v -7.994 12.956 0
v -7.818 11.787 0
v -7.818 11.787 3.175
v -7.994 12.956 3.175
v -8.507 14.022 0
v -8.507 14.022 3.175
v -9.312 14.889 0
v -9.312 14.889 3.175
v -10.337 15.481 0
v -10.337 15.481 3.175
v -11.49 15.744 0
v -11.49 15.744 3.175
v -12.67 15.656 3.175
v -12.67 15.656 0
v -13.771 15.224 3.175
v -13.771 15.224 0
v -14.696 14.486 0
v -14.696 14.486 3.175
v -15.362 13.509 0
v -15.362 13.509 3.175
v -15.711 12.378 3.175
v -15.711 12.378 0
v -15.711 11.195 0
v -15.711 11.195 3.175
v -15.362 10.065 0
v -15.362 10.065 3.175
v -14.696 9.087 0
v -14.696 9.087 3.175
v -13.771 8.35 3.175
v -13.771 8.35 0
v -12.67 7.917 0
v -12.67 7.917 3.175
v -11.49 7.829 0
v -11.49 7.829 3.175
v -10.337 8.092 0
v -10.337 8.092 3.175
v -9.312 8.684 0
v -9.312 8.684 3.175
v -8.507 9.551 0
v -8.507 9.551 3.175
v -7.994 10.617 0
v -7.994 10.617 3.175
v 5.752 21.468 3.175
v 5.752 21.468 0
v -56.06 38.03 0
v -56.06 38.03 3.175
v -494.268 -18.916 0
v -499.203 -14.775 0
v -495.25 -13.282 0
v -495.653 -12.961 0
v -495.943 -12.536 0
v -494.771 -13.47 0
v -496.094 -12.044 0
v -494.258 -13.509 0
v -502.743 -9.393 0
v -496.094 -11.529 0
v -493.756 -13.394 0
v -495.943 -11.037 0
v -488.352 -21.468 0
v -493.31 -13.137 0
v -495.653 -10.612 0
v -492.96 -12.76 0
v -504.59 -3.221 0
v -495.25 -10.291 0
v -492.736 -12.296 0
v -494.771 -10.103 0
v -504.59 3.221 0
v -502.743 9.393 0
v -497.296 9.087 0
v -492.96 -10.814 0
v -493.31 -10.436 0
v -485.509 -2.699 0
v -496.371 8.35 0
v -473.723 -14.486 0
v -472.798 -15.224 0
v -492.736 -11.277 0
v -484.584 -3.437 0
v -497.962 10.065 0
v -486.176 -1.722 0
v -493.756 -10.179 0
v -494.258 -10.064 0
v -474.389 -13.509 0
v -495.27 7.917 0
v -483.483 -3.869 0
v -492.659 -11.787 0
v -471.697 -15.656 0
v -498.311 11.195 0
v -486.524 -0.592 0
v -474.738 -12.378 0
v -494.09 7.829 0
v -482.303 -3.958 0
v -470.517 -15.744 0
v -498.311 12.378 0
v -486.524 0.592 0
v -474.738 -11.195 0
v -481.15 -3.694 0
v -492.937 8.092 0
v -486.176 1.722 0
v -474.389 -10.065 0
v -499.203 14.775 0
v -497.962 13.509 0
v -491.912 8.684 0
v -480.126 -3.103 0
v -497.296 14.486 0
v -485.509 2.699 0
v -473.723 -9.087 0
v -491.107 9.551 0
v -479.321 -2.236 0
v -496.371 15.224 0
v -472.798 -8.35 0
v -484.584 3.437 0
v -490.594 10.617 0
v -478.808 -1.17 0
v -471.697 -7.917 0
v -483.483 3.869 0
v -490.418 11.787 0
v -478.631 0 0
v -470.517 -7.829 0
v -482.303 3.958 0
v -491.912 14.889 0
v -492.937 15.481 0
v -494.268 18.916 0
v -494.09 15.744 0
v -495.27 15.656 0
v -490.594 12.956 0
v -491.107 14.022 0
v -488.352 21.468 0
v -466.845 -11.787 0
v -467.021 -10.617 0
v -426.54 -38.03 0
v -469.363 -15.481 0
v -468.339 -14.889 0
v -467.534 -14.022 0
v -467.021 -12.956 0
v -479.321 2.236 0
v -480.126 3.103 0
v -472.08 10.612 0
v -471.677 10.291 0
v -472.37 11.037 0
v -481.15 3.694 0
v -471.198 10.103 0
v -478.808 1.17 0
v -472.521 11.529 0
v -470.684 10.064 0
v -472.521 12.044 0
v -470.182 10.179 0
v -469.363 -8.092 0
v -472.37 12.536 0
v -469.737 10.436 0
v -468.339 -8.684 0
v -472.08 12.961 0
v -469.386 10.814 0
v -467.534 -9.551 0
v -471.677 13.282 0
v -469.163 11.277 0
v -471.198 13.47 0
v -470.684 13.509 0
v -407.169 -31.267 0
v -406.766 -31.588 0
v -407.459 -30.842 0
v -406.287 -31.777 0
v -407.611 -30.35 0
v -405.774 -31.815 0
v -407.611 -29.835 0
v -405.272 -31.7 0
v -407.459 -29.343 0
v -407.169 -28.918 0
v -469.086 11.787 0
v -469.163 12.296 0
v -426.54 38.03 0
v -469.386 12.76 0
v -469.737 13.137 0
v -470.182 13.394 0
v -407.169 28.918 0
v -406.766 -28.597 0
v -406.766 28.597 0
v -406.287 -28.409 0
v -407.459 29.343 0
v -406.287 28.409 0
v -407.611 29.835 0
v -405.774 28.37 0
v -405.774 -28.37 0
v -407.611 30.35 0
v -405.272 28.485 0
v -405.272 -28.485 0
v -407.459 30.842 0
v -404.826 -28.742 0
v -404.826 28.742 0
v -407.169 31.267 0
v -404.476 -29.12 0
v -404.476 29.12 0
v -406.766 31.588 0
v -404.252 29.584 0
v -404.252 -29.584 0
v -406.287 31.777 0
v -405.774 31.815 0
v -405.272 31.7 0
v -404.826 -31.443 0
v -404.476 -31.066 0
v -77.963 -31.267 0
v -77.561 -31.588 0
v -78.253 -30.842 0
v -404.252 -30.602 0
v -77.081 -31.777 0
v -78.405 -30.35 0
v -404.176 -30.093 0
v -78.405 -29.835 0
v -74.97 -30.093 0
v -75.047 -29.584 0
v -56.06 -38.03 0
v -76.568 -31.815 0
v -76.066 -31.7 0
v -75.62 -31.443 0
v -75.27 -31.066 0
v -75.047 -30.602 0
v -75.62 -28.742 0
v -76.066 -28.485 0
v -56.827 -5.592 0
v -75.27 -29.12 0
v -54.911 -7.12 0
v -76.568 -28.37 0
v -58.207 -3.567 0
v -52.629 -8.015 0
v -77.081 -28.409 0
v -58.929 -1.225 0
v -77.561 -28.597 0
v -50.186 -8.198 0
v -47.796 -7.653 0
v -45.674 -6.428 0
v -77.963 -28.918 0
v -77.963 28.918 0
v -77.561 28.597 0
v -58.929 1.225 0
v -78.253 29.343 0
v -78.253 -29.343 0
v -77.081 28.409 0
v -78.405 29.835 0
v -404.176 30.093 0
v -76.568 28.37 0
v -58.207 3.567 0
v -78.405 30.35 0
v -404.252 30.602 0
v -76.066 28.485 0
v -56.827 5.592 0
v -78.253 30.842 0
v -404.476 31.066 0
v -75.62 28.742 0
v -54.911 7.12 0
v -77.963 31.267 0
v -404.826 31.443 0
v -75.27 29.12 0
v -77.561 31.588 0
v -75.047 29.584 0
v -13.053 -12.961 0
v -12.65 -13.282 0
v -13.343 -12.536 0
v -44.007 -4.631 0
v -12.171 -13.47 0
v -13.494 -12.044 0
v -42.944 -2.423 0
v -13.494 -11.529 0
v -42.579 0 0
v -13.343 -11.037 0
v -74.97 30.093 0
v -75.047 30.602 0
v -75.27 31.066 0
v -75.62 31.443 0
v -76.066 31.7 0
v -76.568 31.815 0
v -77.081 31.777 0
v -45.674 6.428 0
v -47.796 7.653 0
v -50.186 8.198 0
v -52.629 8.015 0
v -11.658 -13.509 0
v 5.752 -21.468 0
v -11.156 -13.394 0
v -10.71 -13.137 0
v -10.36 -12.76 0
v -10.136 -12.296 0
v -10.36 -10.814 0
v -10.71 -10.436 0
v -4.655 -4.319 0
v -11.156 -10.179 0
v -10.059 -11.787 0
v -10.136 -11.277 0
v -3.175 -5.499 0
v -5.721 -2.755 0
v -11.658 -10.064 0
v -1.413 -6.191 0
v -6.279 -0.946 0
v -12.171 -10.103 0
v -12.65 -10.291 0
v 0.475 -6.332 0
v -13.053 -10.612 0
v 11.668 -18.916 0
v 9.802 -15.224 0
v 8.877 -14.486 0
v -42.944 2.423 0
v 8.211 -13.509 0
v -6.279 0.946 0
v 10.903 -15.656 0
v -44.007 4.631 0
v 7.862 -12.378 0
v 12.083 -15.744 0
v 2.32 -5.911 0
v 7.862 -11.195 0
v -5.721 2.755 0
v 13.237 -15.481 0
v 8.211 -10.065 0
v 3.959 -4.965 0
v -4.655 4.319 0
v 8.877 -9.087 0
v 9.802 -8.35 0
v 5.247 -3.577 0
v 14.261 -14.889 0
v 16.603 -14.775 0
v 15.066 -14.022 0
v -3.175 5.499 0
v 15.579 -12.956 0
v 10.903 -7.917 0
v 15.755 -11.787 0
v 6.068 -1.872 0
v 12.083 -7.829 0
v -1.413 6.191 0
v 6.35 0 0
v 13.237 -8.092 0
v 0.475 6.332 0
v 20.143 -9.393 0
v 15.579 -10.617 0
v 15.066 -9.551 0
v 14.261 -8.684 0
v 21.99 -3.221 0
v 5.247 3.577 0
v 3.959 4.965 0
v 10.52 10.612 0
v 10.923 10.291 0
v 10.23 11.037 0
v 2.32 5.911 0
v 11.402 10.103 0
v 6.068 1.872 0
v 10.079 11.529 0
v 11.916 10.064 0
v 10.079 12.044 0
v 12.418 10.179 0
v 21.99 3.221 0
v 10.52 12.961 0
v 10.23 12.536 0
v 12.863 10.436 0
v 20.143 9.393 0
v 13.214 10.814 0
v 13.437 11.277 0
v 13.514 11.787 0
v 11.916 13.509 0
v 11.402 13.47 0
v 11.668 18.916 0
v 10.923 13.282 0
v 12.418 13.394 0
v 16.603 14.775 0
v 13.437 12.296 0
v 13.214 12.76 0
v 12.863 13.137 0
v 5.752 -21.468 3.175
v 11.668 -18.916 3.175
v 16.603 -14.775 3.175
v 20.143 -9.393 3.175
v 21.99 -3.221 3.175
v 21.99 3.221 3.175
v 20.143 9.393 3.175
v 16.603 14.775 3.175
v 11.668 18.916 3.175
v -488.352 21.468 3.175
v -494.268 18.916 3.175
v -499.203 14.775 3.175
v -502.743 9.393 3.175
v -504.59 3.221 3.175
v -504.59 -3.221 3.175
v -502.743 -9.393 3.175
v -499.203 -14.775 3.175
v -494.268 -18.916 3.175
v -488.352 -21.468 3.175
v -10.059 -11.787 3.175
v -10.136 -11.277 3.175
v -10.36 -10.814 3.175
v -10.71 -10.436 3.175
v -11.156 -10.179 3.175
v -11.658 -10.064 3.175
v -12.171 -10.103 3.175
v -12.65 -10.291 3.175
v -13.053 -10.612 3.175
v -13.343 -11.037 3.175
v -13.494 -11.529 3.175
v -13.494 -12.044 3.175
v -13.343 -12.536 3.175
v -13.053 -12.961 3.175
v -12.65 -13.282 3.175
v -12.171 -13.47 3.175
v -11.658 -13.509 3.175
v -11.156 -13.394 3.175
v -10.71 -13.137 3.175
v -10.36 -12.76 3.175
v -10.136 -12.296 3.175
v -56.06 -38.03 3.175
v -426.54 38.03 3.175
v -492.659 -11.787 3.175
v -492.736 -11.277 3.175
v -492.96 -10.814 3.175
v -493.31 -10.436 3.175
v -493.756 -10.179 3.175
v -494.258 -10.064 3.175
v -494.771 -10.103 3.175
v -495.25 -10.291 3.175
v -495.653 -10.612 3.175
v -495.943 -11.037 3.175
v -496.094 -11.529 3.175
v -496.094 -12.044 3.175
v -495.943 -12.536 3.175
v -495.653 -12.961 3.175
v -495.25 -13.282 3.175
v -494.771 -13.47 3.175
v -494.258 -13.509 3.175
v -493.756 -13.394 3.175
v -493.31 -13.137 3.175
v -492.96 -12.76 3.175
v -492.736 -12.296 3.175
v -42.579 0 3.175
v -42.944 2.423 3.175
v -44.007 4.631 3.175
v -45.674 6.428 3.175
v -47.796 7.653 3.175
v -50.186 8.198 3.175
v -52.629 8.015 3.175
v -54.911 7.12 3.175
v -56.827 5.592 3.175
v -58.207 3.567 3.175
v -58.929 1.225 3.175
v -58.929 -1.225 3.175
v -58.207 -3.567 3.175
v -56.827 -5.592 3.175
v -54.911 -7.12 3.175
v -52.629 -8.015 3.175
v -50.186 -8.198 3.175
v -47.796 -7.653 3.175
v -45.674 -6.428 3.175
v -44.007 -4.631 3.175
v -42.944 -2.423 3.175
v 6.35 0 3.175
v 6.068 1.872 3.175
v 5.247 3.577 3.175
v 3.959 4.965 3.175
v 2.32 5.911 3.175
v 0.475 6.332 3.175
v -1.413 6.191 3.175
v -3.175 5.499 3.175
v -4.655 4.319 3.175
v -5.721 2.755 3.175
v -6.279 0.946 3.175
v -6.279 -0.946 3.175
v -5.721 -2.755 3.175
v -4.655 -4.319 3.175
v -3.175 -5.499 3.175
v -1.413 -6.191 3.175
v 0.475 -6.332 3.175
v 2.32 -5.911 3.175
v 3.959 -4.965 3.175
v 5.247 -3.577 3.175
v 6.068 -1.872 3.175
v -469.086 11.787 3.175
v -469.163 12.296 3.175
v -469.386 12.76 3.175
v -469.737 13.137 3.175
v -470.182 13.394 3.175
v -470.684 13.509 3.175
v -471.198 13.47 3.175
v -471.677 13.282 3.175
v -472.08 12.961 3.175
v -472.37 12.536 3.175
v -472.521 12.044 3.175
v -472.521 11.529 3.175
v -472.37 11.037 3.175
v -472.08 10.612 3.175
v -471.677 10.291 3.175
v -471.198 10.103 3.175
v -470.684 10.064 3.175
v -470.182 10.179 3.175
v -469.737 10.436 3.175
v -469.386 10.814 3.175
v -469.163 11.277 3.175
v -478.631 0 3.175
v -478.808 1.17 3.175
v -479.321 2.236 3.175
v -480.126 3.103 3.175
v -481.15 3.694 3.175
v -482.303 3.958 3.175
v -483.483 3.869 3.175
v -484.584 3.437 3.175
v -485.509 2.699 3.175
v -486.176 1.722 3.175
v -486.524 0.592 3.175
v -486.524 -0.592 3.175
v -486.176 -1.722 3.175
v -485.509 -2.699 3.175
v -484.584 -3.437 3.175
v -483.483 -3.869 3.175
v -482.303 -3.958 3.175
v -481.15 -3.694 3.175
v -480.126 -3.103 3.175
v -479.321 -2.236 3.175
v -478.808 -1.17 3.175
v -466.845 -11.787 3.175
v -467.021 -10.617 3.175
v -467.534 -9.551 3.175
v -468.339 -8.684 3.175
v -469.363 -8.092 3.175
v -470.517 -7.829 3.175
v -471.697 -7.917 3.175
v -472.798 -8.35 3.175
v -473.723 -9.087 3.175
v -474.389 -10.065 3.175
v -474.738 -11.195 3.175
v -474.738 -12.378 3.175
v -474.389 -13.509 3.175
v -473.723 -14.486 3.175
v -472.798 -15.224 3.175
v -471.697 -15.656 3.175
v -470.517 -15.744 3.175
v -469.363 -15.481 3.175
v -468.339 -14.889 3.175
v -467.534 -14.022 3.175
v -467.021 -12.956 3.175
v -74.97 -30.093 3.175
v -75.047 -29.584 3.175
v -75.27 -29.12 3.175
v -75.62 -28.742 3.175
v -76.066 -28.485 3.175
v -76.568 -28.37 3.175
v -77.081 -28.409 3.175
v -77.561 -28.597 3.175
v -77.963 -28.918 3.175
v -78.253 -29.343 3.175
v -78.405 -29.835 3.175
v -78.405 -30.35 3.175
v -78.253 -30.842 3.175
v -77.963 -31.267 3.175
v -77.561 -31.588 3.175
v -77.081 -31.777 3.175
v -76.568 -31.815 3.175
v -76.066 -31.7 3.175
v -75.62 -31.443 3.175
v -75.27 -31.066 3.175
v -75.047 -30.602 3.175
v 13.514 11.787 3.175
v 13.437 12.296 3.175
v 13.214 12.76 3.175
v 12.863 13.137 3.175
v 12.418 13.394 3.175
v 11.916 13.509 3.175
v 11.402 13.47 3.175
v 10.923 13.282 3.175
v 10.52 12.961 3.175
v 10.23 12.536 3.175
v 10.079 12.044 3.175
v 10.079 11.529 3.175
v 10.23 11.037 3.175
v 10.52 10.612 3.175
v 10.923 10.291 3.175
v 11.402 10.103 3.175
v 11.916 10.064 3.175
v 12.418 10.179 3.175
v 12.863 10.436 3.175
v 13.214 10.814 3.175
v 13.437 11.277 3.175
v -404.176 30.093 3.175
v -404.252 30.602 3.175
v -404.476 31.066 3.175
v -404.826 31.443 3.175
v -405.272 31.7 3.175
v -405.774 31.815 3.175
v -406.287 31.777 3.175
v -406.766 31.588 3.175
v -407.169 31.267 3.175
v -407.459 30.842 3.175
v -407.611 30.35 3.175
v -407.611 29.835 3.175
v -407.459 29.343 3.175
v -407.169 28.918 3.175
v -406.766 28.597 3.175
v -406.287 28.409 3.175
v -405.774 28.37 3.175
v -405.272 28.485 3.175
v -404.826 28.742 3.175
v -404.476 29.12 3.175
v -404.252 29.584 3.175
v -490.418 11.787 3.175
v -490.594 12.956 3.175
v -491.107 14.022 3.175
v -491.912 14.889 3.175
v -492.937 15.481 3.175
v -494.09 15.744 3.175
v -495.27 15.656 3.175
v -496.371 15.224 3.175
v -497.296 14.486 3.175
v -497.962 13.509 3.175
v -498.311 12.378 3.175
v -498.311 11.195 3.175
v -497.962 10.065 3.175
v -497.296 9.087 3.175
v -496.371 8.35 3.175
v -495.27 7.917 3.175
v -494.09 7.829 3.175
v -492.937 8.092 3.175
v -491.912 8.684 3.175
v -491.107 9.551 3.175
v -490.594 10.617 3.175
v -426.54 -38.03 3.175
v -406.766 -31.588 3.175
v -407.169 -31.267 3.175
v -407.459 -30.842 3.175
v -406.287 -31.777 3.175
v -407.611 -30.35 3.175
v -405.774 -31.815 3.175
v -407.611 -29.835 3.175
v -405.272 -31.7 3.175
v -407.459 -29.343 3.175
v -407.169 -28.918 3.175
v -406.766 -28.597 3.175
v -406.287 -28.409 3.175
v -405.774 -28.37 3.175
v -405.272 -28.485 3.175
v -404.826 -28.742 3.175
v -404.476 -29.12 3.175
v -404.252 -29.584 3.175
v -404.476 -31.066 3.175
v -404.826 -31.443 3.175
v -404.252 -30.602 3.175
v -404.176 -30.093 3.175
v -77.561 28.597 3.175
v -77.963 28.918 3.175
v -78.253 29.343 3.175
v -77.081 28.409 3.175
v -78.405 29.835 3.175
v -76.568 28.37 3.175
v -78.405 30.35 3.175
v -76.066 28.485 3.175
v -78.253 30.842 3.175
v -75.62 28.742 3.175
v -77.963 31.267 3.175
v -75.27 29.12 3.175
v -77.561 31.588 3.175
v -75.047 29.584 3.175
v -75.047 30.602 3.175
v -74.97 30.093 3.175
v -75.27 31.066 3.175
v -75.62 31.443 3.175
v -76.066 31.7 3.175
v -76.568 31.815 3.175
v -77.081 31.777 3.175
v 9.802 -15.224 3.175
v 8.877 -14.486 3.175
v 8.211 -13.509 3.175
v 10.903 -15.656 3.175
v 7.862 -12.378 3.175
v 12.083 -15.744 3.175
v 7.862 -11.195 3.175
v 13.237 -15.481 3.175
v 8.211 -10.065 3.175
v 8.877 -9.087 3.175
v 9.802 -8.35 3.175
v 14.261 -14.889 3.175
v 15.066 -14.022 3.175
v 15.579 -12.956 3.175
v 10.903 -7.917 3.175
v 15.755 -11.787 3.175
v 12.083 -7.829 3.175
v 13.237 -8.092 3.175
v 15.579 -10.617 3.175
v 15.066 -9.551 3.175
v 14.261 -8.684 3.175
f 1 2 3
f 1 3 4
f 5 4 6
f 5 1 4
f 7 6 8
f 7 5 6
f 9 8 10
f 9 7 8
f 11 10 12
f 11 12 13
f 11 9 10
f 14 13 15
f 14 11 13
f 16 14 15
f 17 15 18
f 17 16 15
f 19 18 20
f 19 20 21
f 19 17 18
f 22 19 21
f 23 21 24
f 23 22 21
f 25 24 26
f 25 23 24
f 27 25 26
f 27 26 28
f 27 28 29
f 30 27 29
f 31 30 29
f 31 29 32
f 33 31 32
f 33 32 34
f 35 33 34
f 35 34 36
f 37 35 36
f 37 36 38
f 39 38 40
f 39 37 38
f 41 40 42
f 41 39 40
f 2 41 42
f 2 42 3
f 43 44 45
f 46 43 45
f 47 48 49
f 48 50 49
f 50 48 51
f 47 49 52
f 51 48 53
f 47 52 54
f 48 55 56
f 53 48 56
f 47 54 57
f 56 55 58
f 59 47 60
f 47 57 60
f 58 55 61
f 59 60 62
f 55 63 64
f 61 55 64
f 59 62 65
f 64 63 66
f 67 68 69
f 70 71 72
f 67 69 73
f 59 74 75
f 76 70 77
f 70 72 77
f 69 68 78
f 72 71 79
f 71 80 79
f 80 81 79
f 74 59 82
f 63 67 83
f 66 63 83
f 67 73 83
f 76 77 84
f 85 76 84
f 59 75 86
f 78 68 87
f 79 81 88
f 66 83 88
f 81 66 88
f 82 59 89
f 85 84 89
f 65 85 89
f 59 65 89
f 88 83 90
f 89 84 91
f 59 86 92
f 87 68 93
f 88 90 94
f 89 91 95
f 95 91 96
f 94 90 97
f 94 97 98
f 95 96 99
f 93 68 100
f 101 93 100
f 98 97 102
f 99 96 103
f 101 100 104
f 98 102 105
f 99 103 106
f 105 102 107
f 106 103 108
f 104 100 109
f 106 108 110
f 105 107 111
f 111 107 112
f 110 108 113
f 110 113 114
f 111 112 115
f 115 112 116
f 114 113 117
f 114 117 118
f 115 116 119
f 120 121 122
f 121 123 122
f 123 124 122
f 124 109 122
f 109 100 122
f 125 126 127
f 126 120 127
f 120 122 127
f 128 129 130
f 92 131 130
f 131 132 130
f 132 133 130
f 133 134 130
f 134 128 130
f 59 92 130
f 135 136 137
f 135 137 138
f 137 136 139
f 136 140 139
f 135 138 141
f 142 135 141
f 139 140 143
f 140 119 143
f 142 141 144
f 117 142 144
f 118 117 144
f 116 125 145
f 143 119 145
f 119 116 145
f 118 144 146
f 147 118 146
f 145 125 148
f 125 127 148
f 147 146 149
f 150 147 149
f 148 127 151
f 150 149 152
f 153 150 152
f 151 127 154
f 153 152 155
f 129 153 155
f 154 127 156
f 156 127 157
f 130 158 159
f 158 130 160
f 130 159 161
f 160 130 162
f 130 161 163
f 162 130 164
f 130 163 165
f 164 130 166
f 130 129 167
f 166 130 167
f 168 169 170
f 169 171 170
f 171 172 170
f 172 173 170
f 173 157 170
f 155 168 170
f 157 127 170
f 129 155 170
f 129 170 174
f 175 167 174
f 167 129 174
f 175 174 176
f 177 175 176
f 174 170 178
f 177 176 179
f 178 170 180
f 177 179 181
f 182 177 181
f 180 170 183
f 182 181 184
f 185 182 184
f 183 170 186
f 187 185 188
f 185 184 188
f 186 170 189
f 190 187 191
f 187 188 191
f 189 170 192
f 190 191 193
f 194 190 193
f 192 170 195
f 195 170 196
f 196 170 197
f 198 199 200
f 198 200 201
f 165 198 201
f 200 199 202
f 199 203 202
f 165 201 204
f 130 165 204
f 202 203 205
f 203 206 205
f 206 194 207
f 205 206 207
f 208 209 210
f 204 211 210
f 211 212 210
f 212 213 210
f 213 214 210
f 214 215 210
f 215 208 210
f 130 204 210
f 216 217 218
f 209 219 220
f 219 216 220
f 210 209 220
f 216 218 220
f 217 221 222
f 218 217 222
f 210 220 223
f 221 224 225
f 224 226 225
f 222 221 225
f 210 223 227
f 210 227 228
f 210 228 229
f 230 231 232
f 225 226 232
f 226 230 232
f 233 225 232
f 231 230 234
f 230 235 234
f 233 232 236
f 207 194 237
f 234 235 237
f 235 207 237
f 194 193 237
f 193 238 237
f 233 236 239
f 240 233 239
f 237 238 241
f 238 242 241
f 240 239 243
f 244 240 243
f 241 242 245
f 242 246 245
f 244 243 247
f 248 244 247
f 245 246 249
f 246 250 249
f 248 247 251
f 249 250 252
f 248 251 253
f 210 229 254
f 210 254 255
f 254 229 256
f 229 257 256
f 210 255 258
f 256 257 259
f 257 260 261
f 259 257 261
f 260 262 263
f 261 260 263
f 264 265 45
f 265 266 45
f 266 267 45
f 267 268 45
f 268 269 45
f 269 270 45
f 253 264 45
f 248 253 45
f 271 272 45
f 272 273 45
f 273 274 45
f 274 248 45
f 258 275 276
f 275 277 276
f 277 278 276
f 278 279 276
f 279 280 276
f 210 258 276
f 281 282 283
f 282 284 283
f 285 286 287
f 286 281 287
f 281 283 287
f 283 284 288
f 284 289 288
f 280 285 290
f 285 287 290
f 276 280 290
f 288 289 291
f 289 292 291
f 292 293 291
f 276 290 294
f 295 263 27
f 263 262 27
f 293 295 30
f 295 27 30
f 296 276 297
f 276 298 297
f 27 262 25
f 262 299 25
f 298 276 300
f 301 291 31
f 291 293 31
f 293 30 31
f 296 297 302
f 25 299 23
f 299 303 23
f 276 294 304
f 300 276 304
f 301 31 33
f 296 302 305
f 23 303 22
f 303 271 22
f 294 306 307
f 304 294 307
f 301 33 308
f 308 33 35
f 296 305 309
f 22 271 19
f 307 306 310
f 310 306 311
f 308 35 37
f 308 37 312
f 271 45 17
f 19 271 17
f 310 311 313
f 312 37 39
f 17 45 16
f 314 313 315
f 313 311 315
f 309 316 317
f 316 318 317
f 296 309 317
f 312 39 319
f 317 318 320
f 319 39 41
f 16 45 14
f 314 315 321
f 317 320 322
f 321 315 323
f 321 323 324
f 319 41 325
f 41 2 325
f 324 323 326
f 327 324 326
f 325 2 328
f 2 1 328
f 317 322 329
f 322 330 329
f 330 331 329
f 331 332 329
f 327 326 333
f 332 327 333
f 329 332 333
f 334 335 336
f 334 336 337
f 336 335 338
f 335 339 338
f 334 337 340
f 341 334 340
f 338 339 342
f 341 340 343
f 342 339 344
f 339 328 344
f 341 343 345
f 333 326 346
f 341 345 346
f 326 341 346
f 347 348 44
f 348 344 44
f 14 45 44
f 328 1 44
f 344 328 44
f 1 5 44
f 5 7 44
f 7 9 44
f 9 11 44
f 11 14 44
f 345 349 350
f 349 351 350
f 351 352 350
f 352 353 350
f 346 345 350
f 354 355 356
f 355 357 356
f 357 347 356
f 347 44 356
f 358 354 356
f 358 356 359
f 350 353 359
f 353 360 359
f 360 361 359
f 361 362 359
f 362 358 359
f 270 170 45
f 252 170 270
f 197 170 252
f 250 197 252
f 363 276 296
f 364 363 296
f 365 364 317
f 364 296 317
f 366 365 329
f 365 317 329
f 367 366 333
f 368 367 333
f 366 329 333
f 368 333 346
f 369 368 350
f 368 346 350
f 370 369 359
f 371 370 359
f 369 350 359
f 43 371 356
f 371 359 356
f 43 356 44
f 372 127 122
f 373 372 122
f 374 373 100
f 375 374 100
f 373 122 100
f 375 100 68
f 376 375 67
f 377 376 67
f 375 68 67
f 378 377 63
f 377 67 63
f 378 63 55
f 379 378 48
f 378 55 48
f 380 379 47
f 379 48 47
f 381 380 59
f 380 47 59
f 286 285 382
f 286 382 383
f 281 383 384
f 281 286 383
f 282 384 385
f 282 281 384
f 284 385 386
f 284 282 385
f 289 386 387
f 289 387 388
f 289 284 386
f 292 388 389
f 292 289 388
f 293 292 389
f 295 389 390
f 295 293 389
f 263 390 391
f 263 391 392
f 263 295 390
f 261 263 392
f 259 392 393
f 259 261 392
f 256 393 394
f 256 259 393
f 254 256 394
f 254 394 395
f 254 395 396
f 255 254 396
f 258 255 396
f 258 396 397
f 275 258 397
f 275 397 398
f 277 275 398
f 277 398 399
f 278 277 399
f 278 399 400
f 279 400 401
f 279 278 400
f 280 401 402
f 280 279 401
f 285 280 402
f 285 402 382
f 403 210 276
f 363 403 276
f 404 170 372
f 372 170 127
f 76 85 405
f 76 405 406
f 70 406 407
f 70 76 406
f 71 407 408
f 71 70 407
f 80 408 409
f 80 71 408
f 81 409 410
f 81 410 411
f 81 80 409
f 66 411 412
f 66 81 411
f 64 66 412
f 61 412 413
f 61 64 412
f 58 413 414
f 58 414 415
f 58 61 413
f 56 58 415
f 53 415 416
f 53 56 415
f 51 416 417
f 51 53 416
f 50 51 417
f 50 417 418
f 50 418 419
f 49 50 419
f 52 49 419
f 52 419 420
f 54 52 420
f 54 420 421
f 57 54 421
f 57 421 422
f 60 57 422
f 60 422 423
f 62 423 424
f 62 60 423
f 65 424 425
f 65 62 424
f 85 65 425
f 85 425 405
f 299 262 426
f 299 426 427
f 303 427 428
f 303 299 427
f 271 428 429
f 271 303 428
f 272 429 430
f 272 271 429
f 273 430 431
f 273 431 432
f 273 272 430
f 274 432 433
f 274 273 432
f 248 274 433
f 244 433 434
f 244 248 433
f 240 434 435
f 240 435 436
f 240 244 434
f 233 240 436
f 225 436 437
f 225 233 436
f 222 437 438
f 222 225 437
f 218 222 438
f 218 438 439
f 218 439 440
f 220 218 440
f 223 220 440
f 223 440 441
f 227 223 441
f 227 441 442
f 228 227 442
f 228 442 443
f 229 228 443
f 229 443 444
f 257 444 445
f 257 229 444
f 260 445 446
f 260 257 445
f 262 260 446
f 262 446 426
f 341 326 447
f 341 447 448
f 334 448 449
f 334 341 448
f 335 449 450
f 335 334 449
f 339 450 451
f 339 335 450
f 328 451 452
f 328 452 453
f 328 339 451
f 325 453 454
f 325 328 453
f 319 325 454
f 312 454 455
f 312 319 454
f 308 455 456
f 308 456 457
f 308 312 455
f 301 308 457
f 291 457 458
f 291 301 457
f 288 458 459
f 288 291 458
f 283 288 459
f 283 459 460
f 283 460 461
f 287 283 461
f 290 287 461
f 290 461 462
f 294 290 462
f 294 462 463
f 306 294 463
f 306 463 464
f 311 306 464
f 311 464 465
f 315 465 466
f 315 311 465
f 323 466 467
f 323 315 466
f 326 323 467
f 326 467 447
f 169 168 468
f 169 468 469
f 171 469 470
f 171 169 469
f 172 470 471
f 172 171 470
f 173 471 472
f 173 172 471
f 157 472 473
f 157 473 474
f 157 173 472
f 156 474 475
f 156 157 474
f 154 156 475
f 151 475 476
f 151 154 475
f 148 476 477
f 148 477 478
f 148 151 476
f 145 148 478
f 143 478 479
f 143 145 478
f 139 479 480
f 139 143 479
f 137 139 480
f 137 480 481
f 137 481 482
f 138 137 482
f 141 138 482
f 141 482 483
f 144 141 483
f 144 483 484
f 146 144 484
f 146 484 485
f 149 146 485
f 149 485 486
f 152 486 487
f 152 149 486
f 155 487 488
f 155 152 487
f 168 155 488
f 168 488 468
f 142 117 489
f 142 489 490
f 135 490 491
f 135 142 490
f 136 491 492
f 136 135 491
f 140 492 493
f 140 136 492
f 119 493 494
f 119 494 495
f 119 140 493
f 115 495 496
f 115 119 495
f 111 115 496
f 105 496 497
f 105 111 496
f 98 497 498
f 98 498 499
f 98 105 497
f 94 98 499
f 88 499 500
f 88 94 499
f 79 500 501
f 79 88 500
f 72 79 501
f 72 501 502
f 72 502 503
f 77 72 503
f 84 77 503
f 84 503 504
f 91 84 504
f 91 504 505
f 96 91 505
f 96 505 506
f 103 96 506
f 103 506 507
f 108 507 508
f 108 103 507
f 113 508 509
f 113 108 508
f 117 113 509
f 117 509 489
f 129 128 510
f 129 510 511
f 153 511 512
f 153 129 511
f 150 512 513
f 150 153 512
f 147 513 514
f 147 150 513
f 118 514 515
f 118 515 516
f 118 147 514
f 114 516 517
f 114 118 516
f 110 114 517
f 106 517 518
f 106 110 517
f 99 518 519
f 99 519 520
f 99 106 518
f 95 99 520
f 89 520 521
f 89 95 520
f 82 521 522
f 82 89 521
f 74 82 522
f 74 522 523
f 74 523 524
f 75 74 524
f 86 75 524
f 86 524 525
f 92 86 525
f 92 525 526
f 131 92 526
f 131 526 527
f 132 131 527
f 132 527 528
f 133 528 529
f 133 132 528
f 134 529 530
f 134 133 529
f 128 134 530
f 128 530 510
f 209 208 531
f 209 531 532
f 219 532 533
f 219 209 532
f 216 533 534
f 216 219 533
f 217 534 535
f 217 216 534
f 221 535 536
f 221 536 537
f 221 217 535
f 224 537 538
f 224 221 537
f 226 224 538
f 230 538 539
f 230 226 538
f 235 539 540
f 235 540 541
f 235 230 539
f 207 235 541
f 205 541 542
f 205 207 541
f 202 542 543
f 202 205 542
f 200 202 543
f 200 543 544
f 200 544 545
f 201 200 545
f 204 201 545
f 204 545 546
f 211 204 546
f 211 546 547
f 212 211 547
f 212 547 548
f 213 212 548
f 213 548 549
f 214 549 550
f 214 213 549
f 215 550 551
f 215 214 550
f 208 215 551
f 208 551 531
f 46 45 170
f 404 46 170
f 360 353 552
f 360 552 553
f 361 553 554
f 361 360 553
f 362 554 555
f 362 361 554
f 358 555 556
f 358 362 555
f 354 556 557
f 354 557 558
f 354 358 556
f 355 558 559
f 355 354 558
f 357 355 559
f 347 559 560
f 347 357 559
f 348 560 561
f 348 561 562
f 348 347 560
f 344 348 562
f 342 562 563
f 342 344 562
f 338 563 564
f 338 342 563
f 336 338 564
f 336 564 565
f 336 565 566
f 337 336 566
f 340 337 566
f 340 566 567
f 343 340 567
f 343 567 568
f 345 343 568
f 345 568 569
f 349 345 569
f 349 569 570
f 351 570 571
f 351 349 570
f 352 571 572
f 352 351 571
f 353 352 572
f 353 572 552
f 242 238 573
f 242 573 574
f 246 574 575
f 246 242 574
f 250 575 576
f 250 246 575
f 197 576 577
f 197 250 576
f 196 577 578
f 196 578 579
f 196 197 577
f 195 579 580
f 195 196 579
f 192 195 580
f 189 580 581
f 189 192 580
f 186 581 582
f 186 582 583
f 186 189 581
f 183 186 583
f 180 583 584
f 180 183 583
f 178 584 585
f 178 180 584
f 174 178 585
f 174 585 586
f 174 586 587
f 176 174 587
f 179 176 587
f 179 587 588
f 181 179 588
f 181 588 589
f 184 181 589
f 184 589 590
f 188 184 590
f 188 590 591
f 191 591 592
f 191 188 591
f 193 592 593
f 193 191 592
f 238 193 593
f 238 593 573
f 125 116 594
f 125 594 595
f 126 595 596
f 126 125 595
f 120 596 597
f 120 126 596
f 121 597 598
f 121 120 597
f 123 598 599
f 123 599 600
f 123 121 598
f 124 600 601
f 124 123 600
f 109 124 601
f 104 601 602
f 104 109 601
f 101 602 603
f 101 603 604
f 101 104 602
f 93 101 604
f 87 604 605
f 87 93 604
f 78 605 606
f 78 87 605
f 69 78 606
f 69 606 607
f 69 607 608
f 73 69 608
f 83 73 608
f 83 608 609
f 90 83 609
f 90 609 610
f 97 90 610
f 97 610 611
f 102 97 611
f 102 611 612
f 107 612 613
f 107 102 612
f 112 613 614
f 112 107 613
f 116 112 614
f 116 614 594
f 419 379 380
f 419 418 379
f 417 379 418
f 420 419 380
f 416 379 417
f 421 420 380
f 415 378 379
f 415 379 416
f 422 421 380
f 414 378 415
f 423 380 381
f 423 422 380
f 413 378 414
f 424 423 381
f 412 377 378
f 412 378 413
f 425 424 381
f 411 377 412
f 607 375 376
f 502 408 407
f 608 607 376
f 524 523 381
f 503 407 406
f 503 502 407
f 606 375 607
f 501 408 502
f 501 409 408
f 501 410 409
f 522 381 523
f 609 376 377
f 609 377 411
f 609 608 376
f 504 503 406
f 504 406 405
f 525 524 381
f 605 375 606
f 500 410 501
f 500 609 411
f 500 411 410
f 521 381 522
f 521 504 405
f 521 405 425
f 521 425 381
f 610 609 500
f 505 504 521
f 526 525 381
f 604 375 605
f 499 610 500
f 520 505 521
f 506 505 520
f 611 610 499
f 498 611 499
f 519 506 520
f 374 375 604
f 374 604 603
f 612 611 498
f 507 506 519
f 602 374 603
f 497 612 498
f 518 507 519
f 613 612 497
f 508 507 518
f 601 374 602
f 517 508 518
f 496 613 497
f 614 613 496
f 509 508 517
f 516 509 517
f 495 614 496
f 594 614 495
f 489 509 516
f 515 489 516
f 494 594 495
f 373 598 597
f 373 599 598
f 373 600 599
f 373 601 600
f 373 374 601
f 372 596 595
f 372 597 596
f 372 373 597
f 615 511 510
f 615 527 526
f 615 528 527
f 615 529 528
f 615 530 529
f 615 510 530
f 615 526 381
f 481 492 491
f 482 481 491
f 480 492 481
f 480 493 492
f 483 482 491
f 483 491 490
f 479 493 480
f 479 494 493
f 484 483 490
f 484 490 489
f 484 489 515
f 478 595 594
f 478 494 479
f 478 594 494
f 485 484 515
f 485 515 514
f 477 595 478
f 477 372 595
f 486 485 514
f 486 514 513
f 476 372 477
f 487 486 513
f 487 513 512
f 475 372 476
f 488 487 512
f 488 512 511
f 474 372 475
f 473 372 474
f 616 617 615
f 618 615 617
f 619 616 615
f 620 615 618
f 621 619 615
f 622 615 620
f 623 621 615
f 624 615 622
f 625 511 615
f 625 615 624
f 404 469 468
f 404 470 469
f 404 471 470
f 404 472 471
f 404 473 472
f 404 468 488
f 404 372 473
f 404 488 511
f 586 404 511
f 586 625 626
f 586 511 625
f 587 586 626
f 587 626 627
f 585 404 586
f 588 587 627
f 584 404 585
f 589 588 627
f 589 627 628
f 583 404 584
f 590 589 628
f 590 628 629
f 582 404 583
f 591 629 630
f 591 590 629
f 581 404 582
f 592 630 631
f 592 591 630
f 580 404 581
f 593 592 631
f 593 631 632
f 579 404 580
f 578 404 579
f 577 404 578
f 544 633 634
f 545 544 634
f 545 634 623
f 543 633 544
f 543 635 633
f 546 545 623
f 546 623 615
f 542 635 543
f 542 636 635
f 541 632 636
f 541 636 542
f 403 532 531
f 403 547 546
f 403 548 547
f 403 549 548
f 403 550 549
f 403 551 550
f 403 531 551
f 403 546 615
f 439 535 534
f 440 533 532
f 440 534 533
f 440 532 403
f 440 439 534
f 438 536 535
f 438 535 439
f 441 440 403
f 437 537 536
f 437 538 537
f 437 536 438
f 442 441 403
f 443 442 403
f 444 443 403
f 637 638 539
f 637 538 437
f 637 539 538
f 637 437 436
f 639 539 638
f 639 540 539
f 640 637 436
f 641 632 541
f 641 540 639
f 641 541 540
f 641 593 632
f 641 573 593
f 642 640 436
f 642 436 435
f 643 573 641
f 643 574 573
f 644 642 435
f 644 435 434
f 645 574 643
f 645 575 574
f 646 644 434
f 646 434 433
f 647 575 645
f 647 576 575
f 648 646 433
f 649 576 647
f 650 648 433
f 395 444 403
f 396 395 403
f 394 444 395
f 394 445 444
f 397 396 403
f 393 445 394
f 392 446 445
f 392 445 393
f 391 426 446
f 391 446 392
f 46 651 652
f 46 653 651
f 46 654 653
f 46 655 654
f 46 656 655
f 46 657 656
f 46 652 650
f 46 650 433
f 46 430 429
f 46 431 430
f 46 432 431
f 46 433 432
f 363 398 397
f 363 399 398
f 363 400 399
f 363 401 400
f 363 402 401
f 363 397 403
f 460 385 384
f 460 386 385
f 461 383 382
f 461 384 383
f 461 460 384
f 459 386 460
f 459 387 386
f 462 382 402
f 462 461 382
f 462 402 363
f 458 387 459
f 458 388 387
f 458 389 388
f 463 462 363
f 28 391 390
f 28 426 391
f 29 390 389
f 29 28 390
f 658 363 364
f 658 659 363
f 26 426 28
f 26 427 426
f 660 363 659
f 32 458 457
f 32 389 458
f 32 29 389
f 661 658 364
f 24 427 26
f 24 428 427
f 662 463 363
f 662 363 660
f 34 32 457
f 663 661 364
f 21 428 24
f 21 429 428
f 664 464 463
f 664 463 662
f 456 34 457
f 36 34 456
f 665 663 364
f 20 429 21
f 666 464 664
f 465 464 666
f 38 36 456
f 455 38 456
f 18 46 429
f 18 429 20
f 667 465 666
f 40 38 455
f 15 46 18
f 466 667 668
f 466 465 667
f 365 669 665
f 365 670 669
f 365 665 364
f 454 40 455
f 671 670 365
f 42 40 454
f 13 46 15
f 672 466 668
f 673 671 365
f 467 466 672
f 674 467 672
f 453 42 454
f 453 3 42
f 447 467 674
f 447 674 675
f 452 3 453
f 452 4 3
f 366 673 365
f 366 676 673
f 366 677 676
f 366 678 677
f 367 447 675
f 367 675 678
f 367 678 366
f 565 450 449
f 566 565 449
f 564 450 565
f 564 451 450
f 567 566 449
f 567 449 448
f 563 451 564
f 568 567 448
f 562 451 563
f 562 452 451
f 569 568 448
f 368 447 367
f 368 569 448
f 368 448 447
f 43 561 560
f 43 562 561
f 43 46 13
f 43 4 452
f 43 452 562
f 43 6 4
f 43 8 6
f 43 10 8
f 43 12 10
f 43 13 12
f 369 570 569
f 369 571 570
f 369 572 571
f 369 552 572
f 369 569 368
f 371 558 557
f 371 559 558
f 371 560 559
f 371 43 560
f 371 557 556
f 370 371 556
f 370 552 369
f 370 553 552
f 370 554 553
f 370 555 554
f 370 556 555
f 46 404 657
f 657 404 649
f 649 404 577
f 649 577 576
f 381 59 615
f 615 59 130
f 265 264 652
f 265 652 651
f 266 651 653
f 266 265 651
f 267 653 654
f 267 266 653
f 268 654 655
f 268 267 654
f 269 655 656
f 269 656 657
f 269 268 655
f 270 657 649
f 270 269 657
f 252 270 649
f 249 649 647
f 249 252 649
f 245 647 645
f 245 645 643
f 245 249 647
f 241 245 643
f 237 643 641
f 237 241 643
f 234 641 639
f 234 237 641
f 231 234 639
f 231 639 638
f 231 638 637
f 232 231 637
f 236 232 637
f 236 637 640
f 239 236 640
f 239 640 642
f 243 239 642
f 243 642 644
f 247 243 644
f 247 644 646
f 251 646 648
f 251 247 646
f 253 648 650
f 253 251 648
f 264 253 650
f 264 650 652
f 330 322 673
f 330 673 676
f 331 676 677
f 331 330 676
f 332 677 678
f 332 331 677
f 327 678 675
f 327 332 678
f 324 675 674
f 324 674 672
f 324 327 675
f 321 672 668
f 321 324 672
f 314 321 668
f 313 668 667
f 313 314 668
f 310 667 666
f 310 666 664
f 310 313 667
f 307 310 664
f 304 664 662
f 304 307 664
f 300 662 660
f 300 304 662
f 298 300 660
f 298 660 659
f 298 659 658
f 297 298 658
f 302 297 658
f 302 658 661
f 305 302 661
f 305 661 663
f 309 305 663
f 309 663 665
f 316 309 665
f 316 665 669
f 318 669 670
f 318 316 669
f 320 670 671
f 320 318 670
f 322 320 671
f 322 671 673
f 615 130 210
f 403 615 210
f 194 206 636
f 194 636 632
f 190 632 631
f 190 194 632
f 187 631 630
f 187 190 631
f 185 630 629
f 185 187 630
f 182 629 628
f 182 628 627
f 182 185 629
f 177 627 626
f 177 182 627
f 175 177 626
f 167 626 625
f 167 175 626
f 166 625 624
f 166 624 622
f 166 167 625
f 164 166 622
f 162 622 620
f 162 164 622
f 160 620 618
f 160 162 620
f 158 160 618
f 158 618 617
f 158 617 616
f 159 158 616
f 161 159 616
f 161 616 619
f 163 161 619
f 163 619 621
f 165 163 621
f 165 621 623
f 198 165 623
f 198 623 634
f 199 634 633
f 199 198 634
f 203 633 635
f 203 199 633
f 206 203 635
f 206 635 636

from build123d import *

# Parameters (mm, degrees)
F0_R     = 1.7272
F0_R_2   = 3.96875
F0_R_3   = 8.221183
F0_R_4   = 6.35
F1_DEPTH = 3.175


with BuildPart() as f1:
    # F0 (on Top) → F1 (new body)
    with BuildSketch(Plane.XY):
        with BuildLine():
            Line((-426.540354, 38.03015), (-488.352253, 21.467701))
            ThreePointArc((-488.352253, 21.467701), (-504.825, 0), (-488.352253, -21.467701))
            Line((-488.352253, -21.467701), (-426.540354, -38.03015))
            Line((-426.540354, -38.03015), (-420.190354, -38.03015))
            Line((-420.190354, -38.03015), (-62.409646, -38.03015))
            Line((-62.409646, -38.03015), (-56.059646, -38.03015))
            Line((-56.059646, -38.03015), (5.752253, -21.467701))
            ThreePointArc((5.752253, -21.467701), (22.225, 0), (5.752253, 21.467701))
            Line((5.752253, 21.467701), (-56.059646, 38.03015))
            Line((-56.059646, 38.03015), (-62.409646, 38.03015))
            Line((-62.409646, 38.03015), (-420.190354, 38.03015))
            Line((-420.190354, 38.03015), (-426.540354, 38.03015))
        make_face()
        with Locations((-405.902854, -30.09265)):
            Circle(F0_R, mode=Mode.SUBTRACT)
        with Locations((-494.386586, -11.786586)):
            Circle(F0_R, mode=Mode.SUBTRACT)
        with Locations((-470.813414, -11.786586)):
            Circle(F0_R_2, mode=Mode.SUBTRACT)
        with Locations((-76.697146, -30.09265)):
            Circle(F0_R, mode=Mode.SUBTRACT)
        with Locations((-11.786586, -11.786586)):
            Circle(F0_R, mode=Mode.SUBTRACT)
        with Locations((11.786586, -11.786586)):
            Circle(F0_R_2, mode=Mode.SUBTRACT)
        with Locations((-482.6, 0)):
            Circle(F0_R_2, mode=Mode.SUBTRACT)
        with Locations((-494.386586, 11.786586)):
            Circle(F0_R_2, mode=Mode.SUBTRACT)
        with Locations((-470.813414, 11.786586)):
            Circle(F0_R, mode=Mode.SUBTRACT)
        with Locations((-405.902854, 30.09265)):
            Circle(F0_R, mode=Mode.SUBTRACT)
        with Locations((-50.8, 0)):
            Circle(F0_R_3, mode=Mode.SUBTRACT)
        Circle(F0_R_4, mode=Mode.SUBTRACT)
        with Locations((-11.786586, 11.786586)):
            Circle(F0_R_2, mode=Mode.SUBTRACT)
        with Locations((11.786586, 11.786586)):
            Circle(F0_R, mode=Mode.SUBTRACT)
        with Locations((-76.697146, 30.09265)):
            Circle(F0_R, mode=Mode.SUBTRACT)
    extrude(amount=F1_DEPTH)


solid = f1.part
